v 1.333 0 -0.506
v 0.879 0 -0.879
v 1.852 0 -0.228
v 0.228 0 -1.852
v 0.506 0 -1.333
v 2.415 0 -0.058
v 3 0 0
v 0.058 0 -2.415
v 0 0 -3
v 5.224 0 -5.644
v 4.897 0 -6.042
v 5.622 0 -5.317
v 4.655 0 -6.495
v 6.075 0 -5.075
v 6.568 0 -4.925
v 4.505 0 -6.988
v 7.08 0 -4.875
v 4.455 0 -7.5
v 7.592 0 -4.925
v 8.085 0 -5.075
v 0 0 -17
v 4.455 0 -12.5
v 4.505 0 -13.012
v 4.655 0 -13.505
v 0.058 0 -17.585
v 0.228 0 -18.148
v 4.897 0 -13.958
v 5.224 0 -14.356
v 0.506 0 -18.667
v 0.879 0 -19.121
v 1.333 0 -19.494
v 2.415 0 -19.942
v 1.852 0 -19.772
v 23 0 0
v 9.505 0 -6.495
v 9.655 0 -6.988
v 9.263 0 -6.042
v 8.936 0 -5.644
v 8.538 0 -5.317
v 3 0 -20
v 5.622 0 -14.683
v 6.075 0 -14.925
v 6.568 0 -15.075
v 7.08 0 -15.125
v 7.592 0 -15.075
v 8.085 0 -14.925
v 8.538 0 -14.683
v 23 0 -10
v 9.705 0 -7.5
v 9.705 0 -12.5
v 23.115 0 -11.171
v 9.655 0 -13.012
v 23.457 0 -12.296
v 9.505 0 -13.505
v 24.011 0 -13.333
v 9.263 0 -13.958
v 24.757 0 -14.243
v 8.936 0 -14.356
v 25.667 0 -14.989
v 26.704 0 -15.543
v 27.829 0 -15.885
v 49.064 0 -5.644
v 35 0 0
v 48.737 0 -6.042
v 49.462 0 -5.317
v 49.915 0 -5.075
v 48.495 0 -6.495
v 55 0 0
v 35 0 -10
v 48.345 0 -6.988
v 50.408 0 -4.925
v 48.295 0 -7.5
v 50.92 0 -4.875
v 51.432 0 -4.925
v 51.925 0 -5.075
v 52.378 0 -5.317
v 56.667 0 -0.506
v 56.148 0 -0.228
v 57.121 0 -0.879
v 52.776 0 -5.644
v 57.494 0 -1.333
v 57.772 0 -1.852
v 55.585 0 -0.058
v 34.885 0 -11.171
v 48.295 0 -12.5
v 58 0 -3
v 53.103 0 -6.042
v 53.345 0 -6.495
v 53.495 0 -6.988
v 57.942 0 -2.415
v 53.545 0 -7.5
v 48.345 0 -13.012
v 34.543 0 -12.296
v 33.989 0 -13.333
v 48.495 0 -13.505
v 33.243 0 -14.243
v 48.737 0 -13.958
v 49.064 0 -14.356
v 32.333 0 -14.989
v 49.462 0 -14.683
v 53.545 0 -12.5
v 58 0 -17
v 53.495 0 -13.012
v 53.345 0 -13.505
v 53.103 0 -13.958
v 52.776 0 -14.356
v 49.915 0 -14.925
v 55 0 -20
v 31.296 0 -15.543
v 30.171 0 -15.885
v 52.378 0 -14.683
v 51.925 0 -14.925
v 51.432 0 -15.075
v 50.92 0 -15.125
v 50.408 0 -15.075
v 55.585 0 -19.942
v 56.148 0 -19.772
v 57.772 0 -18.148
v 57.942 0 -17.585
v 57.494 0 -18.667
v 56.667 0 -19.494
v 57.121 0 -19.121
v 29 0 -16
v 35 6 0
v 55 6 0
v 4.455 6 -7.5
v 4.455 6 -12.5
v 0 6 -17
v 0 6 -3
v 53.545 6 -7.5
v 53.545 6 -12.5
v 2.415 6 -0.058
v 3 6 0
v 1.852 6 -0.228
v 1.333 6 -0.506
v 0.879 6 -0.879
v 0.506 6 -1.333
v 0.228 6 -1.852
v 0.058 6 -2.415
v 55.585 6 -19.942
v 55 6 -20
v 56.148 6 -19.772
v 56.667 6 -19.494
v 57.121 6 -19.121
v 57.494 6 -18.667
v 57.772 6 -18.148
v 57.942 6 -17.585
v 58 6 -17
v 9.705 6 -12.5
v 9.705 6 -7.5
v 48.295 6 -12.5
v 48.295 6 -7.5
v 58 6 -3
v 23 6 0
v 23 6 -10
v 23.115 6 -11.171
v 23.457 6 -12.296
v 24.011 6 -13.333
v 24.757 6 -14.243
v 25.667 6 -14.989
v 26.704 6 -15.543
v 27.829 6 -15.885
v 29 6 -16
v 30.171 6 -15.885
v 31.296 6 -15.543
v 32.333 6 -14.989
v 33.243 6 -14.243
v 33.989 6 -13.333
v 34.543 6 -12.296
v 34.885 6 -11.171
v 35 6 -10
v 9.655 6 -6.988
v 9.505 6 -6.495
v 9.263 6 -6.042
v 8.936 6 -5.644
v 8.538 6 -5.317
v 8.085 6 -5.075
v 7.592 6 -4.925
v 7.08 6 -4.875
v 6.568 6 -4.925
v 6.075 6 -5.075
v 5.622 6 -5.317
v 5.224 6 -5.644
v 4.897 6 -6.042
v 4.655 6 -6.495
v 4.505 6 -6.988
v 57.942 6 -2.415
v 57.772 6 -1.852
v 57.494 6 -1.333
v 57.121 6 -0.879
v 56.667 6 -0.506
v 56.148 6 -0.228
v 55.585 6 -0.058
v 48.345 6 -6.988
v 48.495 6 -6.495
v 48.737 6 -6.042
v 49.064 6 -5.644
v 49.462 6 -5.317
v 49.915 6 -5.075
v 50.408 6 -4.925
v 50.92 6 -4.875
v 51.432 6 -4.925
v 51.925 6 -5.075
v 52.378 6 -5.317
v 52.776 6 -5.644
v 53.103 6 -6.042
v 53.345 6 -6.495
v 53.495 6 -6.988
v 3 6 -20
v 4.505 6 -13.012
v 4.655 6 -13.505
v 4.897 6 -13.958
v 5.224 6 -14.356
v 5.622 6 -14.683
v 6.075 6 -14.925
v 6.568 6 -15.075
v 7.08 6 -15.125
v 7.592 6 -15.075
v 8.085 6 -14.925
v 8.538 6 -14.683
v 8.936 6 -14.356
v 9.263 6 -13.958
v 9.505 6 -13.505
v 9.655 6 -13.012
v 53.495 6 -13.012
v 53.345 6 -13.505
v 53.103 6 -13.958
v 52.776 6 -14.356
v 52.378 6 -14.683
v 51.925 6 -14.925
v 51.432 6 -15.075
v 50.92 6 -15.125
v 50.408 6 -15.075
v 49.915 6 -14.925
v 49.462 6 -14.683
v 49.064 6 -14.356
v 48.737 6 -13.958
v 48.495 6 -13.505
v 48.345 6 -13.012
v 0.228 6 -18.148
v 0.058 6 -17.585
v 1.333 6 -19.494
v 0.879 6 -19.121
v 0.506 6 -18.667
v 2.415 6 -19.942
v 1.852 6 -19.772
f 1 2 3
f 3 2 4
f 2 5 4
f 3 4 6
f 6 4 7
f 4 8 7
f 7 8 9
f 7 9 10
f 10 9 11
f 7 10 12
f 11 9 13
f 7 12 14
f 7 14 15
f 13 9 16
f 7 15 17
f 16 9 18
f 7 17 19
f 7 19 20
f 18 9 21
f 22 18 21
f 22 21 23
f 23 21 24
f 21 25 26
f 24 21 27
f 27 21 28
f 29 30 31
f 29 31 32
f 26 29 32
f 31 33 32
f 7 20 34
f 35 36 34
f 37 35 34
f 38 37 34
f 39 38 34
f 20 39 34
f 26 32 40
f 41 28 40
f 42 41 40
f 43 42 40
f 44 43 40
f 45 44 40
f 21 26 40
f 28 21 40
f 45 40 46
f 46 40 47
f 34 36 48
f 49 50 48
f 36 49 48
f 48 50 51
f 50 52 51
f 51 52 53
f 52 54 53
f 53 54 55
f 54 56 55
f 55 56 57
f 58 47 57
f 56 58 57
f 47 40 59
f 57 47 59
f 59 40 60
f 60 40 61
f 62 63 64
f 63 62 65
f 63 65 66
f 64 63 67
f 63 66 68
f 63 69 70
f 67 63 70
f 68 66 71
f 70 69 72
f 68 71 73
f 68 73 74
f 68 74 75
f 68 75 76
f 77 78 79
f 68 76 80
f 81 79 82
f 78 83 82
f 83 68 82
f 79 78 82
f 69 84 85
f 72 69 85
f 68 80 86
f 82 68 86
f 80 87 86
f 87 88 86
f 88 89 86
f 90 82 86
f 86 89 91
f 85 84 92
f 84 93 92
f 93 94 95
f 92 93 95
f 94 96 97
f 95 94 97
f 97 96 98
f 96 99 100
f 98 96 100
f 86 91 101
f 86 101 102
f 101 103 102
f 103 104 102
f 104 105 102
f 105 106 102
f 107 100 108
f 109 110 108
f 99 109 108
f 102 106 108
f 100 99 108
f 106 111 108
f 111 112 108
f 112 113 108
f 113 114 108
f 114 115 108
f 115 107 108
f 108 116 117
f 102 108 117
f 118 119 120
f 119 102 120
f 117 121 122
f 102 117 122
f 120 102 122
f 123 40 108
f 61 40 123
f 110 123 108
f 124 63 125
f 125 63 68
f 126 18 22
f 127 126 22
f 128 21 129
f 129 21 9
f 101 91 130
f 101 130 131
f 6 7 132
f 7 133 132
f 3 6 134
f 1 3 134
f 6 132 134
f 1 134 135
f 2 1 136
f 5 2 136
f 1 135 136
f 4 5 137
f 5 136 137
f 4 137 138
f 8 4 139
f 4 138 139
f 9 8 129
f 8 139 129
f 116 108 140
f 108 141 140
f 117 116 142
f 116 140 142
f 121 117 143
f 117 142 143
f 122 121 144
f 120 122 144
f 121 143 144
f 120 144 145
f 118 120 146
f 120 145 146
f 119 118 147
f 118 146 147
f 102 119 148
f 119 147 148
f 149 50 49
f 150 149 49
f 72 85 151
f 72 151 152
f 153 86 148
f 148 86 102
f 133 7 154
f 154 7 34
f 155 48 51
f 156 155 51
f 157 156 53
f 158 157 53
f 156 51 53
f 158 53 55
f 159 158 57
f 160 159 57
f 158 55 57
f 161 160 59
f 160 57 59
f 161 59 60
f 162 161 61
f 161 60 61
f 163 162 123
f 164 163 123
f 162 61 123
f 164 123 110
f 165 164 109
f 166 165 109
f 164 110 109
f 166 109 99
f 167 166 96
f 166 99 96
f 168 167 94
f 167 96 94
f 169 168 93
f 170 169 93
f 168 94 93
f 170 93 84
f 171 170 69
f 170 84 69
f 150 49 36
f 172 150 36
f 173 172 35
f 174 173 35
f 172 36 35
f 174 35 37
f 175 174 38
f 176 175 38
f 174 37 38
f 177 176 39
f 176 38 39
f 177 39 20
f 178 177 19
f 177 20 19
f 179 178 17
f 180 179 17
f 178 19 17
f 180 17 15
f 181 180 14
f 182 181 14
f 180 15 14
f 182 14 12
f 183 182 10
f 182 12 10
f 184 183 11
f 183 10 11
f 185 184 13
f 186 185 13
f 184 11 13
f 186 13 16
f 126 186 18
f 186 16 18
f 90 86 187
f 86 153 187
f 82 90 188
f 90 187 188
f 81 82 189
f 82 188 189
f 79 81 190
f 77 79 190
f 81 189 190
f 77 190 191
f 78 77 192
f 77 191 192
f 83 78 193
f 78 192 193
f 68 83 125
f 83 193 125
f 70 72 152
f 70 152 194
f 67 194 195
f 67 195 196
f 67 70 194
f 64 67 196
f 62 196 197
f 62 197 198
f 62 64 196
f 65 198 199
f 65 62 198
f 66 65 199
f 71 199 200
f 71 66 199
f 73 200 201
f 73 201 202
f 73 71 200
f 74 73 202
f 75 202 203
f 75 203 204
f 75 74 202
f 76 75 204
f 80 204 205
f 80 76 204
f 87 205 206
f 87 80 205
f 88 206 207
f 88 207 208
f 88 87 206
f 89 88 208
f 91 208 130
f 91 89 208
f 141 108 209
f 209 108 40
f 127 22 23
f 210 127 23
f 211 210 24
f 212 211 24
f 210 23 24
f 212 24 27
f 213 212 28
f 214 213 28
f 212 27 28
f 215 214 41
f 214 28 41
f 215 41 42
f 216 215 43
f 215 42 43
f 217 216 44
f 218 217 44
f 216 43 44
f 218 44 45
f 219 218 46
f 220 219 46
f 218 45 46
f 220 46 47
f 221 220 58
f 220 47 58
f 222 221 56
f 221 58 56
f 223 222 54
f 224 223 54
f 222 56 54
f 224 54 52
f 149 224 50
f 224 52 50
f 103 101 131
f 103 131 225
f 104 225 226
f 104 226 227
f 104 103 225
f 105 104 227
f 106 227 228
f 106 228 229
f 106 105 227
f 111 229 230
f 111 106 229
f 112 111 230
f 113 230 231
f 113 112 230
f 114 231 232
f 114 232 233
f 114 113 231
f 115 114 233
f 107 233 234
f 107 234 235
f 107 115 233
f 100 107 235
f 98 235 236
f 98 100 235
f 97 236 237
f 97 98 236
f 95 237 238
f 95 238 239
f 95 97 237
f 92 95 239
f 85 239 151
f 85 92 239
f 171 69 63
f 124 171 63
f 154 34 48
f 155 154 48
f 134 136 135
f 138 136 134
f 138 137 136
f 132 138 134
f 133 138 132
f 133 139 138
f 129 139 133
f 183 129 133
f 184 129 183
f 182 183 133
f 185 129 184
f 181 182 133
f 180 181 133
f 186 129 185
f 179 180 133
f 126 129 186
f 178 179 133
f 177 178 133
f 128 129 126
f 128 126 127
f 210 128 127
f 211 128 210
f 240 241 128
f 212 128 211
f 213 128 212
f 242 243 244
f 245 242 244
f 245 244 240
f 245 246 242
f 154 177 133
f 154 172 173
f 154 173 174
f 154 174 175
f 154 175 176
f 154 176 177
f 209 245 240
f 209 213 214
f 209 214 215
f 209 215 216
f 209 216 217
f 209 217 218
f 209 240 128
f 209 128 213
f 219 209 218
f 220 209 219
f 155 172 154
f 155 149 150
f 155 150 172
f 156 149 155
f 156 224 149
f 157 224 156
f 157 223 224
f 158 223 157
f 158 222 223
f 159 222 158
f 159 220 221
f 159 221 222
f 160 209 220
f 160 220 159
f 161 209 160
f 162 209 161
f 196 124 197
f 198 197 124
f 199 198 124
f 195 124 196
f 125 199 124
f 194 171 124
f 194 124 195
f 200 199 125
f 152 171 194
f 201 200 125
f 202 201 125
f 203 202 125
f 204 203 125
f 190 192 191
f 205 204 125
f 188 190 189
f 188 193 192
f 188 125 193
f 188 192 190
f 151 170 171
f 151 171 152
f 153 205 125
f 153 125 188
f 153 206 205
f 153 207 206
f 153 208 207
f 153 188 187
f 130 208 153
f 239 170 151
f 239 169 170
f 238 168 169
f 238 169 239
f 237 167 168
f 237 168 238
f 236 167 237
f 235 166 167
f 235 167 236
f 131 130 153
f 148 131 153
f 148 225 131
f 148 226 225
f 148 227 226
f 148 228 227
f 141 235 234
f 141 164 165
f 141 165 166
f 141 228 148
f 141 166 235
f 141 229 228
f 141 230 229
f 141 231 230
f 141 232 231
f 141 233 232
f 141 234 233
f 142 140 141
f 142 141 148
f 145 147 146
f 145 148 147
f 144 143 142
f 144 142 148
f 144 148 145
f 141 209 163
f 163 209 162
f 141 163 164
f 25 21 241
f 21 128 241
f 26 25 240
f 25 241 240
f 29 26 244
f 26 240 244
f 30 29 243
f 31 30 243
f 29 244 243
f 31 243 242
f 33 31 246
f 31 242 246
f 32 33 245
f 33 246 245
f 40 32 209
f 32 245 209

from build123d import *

# Parameters (mm, degrees)
BOSS_EXTRUDE1_DEPTH = 6
FILLET1_R           = 3


with BuildPart() as part:
    # Sketch1 → Boss-Extrude1 (new body)
    with BuildSketch(Plane(origin=(0, 0, 0), x_dir=(1, 0, 0), z_dir=(0, 1, 0))):
        with BuildLine():
            Line((0, 0), (23, 0))
            Line((23, 0), (23, 10))
            ThreePointArc((23, 10), (29, 16), (35, 10))
            Line((35, 10), (35, 0))
            Line((35, 0), (58, 0))
            Line((58, 0), (58, 20))
            Line((58, 20), (0, 20))
            Line((0, 20), (0, 0))
        make_face()
        with BuildLine():
            Line((9.705, 12.5), (9.705, 7.5))
            ThreePointArc((9.705, 7.5), (7.08, 4.875), (4.455, 7.5))
            Line((4.455, 7.5), (4.455, 12.5))
            ThreePointArc((4.455, 12.5), (7.08, 15.125), (9.705, 12.5))
        make_face(mode=Mode.SUBTRACT)
        with BuildLine():
            Line((48.295, 12.5), (48.295, 7.5))
            ThreePointArc((48.295, 7.5), (50.92, 4.875), (53.545, 7.5))
            Line((53.545, 7.5), (53.545, 12.5))
            ThreePointArc((53.545, 12.5), (50.92, 15.125), (48.295, 12.5))
        make_face(mode=Mode.SUBTRACT)
    extrude(amount=BOSS_EXTRUDE1_DEPTH)

    # Fillet1
    fillet1_edges = [part.edges().sort_by_distance(p)[0] for p in [
        (0, 3, -20),
        (58, 3, -20),
        (58, 3, 0),
        (0, 3, 0),
    ]]
    fillet(fillet1_edges, radius=FILLET1_R)


solid = part.part
